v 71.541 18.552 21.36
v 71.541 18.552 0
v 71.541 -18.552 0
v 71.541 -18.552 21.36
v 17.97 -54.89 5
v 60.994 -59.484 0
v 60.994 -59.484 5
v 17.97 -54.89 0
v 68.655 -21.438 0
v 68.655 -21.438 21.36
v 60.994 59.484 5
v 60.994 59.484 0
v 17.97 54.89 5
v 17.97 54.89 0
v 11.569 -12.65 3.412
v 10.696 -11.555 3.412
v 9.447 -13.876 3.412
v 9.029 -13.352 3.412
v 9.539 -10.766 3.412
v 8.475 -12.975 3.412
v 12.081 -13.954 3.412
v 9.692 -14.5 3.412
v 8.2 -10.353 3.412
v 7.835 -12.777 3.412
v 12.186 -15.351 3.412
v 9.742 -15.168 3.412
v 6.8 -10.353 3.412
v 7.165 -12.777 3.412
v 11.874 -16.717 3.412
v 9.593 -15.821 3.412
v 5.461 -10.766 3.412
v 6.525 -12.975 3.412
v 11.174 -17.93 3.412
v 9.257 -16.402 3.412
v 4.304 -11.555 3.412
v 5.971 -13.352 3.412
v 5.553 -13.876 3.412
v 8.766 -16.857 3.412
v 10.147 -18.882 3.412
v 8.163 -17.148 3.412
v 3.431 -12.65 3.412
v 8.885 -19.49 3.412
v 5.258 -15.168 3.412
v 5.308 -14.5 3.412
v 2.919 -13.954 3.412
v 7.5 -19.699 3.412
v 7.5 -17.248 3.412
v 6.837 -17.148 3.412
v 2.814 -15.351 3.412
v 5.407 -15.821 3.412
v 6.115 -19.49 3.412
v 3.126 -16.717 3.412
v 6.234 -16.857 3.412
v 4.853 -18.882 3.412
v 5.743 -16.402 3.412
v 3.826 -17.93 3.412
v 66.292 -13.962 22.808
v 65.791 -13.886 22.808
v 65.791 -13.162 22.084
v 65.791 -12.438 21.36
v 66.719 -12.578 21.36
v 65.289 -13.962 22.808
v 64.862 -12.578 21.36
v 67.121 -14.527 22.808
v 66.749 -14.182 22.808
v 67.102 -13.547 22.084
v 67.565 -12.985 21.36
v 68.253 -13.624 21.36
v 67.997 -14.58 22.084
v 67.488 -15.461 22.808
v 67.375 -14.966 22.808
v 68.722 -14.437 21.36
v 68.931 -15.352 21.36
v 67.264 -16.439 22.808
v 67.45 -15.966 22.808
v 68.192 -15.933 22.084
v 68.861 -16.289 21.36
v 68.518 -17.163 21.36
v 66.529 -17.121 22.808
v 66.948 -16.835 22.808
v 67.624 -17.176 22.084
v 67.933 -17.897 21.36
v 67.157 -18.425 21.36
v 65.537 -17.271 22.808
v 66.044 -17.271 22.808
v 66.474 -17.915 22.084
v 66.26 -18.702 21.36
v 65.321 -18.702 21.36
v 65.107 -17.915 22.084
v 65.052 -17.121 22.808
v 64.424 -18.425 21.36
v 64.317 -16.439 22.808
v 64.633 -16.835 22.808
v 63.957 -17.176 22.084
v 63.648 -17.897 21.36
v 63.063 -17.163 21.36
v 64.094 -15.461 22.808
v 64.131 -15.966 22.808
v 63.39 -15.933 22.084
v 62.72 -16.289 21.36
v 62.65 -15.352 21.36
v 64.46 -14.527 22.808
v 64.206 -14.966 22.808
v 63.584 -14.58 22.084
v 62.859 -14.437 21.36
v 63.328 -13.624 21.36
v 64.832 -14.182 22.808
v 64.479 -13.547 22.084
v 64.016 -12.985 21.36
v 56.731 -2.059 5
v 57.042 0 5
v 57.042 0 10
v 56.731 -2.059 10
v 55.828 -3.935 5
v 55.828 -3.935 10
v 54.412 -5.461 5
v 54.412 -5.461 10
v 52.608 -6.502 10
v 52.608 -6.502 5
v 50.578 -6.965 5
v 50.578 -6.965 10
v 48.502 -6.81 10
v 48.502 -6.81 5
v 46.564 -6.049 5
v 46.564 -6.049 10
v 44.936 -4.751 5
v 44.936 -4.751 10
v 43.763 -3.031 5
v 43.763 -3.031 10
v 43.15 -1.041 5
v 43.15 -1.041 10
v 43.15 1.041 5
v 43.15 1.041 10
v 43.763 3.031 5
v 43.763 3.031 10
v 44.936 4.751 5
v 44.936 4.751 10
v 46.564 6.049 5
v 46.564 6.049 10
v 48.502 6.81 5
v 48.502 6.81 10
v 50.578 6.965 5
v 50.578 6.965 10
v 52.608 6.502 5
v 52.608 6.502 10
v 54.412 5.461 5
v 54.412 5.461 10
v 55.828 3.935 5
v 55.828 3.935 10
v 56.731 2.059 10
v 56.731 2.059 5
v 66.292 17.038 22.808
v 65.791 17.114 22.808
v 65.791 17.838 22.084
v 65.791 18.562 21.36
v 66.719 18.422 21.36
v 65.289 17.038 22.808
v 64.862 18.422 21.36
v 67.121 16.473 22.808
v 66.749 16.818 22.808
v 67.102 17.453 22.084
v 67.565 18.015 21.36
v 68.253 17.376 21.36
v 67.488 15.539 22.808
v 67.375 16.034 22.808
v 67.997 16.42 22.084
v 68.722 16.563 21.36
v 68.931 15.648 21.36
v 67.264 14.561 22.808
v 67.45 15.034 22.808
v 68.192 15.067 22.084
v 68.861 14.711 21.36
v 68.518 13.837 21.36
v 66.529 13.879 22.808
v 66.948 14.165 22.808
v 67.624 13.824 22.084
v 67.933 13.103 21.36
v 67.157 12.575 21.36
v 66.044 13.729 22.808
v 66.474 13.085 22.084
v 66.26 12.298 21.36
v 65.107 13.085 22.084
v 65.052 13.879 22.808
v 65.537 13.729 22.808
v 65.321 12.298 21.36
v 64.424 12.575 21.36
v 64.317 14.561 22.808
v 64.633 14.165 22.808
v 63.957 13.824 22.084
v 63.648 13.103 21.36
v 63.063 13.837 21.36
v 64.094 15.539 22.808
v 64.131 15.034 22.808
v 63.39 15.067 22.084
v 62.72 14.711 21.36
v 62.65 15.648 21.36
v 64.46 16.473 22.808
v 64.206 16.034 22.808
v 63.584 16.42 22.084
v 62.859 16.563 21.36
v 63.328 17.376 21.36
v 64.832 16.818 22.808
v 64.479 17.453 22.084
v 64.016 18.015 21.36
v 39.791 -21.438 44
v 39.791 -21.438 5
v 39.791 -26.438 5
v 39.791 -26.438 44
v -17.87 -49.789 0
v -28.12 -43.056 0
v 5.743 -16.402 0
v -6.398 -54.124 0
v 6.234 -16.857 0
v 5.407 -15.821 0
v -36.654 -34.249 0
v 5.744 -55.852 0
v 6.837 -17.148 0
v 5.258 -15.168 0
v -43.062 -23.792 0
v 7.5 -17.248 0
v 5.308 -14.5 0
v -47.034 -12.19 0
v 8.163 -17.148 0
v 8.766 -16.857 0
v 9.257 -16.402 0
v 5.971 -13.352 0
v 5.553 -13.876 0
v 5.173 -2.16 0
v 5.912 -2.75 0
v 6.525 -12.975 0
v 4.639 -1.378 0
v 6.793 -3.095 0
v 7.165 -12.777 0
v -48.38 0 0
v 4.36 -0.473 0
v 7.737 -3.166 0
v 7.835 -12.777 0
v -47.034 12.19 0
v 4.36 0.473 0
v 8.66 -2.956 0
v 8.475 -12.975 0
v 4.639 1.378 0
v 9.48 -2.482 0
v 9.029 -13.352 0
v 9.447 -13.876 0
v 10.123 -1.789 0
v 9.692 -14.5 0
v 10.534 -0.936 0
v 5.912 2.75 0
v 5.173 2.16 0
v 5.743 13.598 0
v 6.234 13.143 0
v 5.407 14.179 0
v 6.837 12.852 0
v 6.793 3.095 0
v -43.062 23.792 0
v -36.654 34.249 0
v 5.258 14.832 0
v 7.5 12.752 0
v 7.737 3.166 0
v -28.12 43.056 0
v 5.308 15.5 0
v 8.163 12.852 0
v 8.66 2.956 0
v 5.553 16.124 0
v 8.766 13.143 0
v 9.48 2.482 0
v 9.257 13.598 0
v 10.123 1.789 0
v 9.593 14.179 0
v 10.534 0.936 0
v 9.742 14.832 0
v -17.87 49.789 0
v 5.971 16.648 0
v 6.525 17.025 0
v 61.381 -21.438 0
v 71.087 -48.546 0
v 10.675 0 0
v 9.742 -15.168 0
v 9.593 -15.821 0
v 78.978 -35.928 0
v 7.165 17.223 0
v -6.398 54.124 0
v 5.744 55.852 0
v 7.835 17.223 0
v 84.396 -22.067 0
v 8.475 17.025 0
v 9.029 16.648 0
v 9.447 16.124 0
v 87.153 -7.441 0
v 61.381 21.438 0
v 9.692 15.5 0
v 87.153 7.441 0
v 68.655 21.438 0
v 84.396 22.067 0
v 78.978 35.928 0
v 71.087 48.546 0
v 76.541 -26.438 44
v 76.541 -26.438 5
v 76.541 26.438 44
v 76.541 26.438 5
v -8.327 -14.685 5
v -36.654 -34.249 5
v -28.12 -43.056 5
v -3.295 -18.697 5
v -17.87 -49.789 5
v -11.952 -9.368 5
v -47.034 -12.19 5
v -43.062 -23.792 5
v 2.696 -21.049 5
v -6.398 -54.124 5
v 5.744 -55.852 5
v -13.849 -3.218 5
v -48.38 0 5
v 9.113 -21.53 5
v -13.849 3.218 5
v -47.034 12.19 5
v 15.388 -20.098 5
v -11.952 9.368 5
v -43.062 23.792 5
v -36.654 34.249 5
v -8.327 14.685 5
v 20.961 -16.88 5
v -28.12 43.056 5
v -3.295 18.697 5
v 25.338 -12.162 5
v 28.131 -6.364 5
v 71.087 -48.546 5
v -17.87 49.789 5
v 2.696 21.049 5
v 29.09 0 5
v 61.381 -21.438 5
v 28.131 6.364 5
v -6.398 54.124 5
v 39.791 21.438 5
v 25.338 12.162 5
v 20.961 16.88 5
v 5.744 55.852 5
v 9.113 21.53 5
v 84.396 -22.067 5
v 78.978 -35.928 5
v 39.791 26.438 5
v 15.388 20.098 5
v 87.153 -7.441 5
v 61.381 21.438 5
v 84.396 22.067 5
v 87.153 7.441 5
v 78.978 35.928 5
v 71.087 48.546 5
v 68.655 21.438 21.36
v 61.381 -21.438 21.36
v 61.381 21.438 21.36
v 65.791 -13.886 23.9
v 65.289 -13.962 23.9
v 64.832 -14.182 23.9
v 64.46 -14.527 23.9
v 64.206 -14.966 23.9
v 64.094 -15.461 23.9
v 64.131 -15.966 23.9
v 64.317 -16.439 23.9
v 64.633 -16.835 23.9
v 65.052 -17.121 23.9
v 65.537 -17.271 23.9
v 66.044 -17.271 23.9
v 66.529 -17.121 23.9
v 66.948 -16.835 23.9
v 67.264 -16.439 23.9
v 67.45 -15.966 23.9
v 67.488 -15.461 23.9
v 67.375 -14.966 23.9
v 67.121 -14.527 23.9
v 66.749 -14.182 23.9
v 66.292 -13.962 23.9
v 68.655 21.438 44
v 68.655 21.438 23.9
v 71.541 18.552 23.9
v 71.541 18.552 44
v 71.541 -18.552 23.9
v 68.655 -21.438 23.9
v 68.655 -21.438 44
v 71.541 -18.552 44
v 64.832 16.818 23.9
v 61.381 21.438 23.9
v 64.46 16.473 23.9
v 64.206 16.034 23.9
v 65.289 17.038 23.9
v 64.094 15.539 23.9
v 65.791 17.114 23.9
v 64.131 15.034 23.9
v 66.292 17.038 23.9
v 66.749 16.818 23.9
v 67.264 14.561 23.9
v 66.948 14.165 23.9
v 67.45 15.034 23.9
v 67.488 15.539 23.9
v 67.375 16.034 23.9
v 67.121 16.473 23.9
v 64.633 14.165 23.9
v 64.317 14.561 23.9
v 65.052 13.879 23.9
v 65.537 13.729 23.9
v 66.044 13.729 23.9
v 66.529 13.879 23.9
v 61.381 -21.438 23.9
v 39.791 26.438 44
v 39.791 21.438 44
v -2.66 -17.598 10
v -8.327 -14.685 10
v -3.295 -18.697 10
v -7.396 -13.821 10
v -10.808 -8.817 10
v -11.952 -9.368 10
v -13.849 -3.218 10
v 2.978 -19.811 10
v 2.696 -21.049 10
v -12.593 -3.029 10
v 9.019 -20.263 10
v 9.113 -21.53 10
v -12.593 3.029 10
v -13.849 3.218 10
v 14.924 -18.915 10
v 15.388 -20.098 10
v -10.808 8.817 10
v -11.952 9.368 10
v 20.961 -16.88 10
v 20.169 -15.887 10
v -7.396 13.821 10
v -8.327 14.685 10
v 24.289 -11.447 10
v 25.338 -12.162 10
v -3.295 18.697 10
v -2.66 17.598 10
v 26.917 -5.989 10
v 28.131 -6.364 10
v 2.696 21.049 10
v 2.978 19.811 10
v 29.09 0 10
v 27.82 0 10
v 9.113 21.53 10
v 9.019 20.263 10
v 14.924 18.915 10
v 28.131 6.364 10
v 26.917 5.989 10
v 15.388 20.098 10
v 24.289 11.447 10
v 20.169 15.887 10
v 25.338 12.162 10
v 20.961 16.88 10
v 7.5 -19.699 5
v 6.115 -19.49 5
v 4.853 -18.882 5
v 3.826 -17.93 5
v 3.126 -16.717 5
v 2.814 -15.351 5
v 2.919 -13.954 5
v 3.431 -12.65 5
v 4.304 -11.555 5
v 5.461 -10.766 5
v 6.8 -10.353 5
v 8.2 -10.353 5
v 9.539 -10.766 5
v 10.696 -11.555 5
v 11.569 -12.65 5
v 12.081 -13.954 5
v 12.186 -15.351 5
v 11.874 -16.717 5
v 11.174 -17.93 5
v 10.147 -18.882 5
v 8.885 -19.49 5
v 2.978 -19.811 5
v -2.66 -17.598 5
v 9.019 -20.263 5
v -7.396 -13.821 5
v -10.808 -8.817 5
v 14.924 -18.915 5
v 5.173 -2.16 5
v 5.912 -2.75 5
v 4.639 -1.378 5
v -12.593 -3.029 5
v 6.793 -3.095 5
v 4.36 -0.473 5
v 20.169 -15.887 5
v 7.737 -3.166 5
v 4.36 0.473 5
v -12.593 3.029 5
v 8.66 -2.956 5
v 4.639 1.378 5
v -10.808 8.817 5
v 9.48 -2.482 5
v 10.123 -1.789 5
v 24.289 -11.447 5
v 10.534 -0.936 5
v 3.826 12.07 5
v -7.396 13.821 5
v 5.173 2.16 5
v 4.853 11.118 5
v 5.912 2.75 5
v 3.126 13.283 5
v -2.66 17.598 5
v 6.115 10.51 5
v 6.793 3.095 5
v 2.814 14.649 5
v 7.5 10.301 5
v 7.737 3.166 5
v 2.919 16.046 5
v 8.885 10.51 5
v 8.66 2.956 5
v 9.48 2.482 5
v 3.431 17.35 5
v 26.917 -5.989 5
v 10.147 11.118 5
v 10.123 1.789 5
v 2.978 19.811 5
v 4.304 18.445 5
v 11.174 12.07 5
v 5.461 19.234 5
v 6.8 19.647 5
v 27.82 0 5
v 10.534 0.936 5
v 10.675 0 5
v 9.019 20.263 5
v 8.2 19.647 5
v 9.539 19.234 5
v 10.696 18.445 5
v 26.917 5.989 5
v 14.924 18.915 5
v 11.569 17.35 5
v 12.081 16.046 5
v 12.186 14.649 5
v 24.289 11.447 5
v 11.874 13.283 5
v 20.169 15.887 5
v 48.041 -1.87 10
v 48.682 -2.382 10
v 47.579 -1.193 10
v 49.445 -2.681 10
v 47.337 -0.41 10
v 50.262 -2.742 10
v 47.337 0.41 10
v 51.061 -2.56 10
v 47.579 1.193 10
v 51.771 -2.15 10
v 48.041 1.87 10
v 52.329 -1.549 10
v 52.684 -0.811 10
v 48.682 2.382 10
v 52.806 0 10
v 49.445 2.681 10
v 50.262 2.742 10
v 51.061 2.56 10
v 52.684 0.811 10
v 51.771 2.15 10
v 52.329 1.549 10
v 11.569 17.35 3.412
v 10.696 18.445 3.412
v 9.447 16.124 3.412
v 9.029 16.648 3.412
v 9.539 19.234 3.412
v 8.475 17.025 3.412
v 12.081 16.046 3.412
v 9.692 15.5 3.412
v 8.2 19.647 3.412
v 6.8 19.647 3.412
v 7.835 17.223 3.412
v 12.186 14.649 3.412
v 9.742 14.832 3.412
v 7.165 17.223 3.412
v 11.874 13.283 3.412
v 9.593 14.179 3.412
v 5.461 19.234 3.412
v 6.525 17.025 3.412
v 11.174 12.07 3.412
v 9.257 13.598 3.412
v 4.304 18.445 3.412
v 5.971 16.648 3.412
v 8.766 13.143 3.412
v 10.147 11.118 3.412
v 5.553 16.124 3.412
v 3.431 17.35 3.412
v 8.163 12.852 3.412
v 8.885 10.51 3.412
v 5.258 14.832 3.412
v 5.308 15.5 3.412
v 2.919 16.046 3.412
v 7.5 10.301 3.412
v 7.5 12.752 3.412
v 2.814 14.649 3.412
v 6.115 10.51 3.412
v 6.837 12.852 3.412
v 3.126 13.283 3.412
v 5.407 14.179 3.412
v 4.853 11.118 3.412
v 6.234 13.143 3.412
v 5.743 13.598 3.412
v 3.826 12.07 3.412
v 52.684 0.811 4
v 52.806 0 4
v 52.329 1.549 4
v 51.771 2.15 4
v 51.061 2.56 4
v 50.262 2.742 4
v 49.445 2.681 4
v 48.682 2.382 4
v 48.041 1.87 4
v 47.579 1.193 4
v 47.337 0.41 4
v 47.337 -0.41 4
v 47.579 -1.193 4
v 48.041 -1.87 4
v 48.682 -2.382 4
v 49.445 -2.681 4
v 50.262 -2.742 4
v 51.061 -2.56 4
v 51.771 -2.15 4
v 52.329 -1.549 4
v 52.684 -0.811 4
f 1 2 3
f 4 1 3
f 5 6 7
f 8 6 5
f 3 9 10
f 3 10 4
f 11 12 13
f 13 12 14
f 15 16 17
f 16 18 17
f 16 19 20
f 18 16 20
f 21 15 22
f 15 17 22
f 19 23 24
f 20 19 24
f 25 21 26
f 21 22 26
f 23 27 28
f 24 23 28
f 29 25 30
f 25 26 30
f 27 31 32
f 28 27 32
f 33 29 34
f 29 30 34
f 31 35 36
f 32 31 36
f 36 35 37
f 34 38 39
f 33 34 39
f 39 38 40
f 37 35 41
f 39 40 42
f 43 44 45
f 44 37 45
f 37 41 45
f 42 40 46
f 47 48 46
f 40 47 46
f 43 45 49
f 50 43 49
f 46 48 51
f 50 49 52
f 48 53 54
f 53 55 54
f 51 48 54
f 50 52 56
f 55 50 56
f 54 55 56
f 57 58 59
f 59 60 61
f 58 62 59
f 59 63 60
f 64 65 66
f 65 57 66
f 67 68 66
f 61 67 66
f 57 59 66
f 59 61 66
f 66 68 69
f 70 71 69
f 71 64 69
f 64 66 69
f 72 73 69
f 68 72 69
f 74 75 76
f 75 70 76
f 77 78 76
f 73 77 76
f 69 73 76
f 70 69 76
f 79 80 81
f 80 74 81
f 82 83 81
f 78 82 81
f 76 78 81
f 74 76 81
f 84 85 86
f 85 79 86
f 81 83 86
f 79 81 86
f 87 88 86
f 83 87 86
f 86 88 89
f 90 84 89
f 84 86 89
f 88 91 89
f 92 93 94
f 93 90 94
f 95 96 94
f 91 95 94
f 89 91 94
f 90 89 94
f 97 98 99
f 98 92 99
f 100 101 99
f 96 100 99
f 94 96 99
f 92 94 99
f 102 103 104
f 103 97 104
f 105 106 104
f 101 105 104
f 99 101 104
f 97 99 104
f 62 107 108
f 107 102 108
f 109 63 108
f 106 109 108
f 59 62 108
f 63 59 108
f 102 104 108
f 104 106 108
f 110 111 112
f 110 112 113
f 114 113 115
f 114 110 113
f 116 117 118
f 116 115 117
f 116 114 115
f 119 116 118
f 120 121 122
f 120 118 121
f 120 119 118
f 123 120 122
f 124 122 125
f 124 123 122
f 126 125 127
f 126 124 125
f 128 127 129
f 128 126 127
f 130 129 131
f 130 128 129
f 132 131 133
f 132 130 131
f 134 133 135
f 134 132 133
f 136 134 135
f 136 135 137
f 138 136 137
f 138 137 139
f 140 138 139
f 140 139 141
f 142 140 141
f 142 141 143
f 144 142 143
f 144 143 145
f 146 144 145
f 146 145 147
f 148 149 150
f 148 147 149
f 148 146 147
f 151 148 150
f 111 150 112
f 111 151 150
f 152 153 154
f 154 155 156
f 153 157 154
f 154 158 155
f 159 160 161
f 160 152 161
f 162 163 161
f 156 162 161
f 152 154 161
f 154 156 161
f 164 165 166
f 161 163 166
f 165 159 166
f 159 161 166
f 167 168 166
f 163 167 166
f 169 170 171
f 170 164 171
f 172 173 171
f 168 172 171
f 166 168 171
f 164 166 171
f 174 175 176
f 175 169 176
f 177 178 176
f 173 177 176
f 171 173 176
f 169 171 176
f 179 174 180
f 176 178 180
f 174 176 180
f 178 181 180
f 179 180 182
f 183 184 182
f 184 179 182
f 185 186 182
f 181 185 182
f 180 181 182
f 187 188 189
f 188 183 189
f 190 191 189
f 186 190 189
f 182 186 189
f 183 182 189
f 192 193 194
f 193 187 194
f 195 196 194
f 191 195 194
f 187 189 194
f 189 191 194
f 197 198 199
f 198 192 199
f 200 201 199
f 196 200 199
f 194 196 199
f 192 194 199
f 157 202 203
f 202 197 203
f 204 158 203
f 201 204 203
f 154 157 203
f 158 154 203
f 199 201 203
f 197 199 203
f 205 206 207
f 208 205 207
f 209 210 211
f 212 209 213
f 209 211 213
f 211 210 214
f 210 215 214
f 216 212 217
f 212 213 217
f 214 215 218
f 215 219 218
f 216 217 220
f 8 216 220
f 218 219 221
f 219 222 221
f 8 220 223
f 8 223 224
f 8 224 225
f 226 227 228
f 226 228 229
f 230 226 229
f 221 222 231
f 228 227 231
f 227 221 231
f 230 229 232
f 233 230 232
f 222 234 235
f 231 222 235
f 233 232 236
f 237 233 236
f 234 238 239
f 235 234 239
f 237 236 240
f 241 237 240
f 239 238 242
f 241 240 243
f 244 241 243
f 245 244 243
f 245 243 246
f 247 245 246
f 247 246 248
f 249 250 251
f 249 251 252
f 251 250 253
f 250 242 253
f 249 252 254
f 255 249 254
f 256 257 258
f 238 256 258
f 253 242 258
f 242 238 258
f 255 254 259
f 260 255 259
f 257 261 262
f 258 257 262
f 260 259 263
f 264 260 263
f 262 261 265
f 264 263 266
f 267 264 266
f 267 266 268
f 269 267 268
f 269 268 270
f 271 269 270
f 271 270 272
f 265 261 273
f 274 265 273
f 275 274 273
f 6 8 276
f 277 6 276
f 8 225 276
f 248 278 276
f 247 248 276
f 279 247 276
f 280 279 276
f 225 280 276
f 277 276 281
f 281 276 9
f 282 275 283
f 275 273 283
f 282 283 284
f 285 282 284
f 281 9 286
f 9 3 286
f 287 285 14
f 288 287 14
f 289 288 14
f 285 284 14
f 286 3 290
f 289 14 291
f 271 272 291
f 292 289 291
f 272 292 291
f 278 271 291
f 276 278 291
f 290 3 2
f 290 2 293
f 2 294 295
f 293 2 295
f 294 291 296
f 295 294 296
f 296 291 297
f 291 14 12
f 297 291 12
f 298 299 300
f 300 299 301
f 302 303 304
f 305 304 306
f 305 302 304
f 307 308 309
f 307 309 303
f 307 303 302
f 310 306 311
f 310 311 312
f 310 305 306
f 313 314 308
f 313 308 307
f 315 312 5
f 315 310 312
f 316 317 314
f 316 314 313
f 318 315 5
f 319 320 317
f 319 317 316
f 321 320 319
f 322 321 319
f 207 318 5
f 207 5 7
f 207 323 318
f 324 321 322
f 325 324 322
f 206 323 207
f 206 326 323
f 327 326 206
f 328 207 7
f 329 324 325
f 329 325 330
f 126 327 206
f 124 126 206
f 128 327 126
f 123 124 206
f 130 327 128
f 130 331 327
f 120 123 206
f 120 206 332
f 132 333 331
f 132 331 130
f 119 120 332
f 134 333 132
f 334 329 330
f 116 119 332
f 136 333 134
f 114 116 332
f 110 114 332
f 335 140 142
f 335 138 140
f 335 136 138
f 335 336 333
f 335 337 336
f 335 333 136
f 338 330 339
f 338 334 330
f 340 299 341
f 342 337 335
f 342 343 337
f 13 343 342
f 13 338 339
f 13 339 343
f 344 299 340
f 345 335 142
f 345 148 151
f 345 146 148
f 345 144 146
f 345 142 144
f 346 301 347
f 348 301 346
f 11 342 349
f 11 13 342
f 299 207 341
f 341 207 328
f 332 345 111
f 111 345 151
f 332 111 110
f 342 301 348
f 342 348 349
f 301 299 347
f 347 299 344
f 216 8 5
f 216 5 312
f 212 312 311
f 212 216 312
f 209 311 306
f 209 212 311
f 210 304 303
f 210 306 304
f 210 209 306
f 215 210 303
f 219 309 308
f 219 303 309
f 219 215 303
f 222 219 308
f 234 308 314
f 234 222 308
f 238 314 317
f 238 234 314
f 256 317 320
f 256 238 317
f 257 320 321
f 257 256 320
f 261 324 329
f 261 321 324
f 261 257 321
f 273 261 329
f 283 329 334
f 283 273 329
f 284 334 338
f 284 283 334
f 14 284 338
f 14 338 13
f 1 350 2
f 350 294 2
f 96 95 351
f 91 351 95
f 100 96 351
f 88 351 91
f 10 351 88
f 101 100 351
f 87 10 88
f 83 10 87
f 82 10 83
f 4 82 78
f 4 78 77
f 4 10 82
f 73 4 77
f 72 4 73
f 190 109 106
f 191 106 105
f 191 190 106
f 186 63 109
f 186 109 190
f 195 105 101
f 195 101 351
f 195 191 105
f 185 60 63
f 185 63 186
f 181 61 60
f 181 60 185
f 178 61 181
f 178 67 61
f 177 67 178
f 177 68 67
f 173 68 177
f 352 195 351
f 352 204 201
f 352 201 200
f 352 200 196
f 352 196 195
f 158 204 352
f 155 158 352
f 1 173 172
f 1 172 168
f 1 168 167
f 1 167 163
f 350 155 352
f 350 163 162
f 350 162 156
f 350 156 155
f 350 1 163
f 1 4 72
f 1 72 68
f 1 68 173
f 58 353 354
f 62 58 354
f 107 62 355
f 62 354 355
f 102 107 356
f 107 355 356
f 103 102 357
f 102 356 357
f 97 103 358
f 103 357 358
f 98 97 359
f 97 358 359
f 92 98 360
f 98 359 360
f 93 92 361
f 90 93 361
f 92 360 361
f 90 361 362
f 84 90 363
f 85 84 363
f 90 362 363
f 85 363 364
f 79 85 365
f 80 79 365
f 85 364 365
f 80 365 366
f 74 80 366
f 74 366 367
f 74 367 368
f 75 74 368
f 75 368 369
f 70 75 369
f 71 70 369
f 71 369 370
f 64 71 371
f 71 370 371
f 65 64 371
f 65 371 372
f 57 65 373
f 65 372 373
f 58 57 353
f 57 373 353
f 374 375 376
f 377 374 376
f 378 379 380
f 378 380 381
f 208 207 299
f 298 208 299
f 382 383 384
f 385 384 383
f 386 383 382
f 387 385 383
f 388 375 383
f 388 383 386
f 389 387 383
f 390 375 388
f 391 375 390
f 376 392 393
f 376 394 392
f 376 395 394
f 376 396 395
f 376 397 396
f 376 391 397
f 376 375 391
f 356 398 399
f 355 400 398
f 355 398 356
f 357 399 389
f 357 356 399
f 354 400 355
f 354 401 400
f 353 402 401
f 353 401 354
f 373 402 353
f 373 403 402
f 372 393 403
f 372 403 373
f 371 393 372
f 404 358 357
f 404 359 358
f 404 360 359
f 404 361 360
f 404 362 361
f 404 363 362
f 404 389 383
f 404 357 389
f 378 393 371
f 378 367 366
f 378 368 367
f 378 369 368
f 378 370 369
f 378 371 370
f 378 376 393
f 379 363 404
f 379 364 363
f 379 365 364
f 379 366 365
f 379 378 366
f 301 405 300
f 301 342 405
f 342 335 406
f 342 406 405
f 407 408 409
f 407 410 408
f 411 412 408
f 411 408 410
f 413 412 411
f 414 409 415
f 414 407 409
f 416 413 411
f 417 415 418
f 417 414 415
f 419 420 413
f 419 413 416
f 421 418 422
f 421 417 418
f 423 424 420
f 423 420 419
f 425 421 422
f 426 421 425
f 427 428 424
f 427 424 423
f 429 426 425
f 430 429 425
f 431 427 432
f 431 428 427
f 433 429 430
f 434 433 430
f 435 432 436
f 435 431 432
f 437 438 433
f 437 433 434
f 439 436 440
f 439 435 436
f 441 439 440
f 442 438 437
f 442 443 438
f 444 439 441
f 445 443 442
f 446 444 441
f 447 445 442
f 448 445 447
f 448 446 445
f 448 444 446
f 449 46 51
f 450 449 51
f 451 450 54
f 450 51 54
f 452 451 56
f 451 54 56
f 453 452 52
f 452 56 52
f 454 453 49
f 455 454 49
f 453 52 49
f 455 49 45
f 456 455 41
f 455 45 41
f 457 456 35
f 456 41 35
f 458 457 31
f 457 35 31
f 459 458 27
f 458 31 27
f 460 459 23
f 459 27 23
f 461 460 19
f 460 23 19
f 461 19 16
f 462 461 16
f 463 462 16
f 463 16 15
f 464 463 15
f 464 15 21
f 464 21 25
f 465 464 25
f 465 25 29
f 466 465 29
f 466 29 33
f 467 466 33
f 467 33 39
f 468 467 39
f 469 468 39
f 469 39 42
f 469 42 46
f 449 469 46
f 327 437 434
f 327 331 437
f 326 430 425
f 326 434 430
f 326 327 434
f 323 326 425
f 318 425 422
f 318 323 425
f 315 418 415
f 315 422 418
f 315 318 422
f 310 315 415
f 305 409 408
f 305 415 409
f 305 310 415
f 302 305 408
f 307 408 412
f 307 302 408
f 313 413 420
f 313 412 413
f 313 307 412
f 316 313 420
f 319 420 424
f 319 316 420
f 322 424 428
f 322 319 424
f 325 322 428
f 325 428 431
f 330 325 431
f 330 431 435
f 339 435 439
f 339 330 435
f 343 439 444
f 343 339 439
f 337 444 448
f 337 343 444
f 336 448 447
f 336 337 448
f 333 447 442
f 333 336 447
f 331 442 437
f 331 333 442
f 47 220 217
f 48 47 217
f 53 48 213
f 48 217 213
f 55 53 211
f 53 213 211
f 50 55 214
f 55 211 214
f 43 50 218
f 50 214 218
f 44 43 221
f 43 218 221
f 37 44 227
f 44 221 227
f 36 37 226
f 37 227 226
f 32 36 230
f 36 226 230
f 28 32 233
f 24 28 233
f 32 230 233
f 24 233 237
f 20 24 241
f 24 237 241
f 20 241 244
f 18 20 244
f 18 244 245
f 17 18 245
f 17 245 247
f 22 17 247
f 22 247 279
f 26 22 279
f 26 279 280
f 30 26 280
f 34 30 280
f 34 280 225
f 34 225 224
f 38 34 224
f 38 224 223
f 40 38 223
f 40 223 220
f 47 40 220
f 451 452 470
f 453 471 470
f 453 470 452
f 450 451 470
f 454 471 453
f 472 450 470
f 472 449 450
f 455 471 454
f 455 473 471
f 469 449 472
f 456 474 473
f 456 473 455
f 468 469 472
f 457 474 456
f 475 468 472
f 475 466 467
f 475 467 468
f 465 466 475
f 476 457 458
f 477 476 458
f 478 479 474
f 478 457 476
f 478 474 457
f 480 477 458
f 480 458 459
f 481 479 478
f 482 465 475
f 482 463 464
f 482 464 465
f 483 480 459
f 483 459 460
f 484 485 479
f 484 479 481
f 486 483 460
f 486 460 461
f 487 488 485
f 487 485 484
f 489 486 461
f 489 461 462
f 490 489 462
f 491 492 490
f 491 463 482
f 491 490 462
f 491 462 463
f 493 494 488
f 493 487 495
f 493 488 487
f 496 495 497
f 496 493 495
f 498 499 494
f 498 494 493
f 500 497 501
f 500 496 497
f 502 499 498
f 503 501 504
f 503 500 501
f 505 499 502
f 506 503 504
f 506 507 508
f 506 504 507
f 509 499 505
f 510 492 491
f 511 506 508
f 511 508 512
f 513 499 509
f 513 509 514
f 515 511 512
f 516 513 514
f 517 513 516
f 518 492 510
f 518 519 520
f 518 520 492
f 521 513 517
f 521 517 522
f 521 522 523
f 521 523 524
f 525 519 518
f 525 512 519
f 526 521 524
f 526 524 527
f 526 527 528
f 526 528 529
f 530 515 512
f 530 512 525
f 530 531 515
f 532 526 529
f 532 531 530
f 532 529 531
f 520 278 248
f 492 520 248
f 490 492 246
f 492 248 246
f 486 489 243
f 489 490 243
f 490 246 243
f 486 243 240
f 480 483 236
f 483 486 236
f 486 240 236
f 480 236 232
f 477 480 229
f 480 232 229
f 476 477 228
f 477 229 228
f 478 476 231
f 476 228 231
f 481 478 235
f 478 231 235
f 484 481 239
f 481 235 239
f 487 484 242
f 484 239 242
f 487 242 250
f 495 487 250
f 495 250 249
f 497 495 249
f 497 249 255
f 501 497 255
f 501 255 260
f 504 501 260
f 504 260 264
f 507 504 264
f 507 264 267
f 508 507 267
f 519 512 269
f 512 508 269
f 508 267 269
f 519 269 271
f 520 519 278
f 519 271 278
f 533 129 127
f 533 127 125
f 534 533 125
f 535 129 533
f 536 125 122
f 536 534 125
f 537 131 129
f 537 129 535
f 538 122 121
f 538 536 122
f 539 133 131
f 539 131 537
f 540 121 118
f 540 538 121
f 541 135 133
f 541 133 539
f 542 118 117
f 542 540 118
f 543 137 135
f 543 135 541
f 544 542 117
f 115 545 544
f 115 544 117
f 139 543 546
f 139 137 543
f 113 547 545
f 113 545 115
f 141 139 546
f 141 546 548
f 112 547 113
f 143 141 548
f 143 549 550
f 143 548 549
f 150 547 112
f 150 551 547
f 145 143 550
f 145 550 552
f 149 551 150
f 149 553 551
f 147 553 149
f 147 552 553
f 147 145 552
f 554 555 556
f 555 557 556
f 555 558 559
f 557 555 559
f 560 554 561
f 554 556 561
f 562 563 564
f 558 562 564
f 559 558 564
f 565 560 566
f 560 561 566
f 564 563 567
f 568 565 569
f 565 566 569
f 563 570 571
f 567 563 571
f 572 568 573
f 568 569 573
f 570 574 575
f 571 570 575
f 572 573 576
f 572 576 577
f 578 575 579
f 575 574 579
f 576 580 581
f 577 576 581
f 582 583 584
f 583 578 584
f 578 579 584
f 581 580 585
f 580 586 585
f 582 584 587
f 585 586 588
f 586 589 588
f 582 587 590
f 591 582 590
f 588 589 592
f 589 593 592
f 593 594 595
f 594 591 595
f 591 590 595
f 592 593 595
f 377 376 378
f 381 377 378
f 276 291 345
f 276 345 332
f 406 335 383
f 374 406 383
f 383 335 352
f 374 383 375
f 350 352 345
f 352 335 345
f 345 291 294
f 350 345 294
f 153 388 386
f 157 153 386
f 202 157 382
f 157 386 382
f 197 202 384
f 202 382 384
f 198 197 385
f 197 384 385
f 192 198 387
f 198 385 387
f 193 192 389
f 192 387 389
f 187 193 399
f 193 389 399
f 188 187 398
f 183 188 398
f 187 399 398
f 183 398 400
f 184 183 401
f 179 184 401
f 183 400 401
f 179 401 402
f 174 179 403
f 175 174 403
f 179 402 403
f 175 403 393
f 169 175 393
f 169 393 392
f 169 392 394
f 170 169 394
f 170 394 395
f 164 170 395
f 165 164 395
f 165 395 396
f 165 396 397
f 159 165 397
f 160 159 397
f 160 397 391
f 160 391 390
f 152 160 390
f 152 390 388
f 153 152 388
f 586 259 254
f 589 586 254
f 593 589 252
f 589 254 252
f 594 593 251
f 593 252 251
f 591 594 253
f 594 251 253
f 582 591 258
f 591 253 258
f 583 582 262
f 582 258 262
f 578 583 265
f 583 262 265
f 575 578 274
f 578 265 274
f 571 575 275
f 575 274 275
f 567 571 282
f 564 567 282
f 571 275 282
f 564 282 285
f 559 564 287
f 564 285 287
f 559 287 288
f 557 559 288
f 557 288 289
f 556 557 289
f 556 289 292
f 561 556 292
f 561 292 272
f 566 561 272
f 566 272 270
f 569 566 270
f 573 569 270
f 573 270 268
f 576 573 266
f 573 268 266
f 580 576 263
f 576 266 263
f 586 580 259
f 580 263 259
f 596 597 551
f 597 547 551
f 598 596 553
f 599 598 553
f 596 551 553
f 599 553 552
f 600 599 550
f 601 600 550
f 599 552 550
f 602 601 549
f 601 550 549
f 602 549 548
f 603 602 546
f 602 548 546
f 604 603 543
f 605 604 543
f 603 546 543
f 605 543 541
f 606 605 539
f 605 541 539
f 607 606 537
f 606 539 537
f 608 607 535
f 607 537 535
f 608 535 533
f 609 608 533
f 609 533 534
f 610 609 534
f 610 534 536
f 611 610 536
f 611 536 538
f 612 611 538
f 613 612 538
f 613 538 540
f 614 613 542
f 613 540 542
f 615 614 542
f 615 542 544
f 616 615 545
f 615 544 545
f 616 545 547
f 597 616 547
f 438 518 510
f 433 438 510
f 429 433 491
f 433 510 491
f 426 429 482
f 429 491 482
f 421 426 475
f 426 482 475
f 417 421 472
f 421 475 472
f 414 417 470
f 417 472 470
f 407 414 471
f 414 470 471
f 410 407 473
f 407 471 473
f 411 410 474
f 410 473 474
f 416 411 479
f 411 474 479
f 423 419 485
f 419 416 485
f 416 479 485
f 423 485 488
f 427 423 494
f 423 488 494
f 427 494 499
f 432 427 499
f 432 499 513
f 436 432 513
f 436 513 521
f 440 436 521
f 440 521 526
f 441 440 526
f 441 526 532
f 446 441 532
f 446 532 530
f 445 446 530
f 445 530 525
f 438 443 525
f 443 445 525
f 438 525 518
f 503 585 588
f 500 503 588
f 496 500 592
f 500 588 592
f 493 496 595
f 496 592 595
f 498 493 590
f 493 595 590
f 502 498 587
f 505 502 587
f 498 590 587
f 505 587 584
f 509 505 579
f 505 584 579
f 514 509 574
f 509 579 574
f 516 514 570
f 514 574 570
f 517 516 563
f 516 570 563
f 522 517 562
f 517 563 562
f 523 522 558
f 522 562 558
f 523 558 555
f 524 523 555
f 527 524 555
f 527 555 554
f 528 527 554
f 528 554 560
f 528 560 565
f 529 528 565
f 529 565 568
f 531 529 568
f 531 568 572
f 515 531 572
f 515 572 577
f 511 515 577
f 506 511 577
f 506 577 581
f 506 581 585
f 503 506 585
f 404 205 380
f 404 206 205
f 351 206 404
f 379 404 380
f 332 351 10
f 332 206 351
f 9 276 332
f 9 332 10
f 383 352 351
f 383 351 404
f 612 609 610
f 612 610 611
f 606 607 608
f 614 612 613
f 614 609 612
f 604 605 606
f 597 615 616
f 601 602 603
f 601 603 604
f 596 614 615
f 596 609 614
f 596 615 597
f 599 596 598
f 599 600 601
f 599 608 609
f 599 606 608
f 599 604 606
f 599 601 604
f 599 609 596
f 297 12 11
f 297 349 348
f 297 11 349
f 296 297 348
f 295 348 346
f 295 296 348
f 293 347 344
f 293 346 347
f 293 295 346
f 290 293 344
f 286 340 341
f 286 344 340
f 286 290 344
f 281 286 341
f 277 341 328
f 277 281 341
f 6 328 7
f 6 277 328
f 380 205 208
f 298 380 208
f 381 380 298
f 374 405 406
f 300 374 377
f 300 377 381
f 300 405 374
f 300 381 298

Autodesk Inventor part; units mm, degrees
ref_plane "YZ Plane" through (0, 0, 0) normal (1, 0, 0) x (0, 1, 0)
ref_plane "XZ Plane" through (0, 0, 0) normal (0, 1, 0) x (-1, 0, 0)
ref_plane "Work Plane1" through (0, 0, 0) normal (0, 0, 1) x (1, 0, 0)
sketch "Sketch1" plane through (0, 0, 0) normal (0, 0, 1) x (1, 0, 0)
  circle A0 centre (7.5, 0) radius 3.175 projected
  circle A1 centre (7.5, 15) radius 2.5 construction
  circle A2 centre (7.5, -15) radius 2.5 construction
  arc A3 (69.3283, 4.3421) -> (-40.362, 3.8938) centre (14.5, 0) ccw construction
  arc A4 (17.9696, 54.8905) -> (17.9696, -54.8905) centre (7.5, 0) ccw
  arc A5 (60.9943, -59.4841) -> (60.9943, 59.4841) centre (7.5, 0) ccw projected
  line L0 (60.9943, 59.4841) -> (17.9696, 54.8905)
  line L1 (60.9943, -59.4841) -> (17.9696, -54.8905)
  point P0 (0, 0)
  dimension "d0" = 55.88
extrude "Primary Shaft Bore" add sketch "Sketch1" along normal blind 5
sketch "Sketch2" plane through (0, 0, 5) normal (0, 0, 1) x (1, 0, 0)
  circle A0 centre (7.5, 0) radius 3.175 construction
  circle A1 centre (7.5, 0) radius 3.175 projected
  circle A2 centre (7.5, 0) radius 20.32
  circle A3 centre (7.5, 0) radius 21.59
  point P0 (0, 0)
  dimension "d3" = 40.64
  dimension "d4" = 43.18
extrude "Large Gear Seat" add sketch "Sketch2" along normal blind 5 contours A3
sketch "Sketch4" plane through (0, 0, 0) normal (0, 0, -1) x (-1, 0, 0)
  circle A0 centre (-7.5, 15) radius 2.5 construction
  circle A1 centre (-7.5, -15) radius 2.5 construction
  point P0 (0, 0)
ref_plane "Work Plane2" through (-496.14, 0, 5) normal (0, 1, 0) x (0, 0, -1)
sketch "Sketch5" plane through (0, 0, 5) normal (0, 0, 1) x (1, 0, 0)
  circle A0 centre (7.5, 0) radius 3.175 projected
  circle A1 centre (7.5, 15) radius 1.5 projected
  circle A2 centre (7.5, -15) radius 1.5 projected
  point P0 (0, 0)
ref_plane "Work Plane5" through (7.5, 0, 5) normal (-1, 0, 0) x (0, -1, 0)
sketch "Sketch7" plane through (0, 0, 5) normal (0, 0, 1) x (1, 0, 0)
  arc A0 (51.7179, -2) -> (48.3952, -2) centre (50.0565, 0) ccw construction
  circle A1 centre (50.0565, 0) radius 6.985
  point P0 (0, 0)
  dimension "d17" = 13.97
extrude "Second Gear Seat" add sketch "Sketch7" along normal up to surface (5 mm away)
sketch "Sketch8" plane through (0, 0, 5) normal (0, 0, 1) x (1, 0, 0)
  point P0 (0, 0)
  point P1 (7.5, 15)
  point P2 (7.5, -15)
hole "Hole1" at (7.5, 15, 5) at (7.5, -15, 5) direction (0, 0, -1) diameter 4.4958 end through all counterbore diameter 9.398 counterbore depth 1.5875 clearance for "Flat Head Machine Screw" size "M4" standard "Ansi Metric M Profile"
sketch "Sketch9" plane through (50.0565, 0, 10) normal (0, 0, 1) x (1, 0, 0)
  arc A0 (1.6613, -2) -> (-1.6613, -2) centre (0, 0) ccw construction
  circle A1 centre (0, 0) radius 2.75
  point P0 (-50.0565, 0)
  dimension "d27" = 5.5
extrude "Extrusion7" cut sketch "Sketch9" against normal blind 6
sketch "Sketch10" plane through (0, 0, 5) normal (0, 0, 1) x (1, 0, 0)
  line L0 (114.676, 0) -> (-75.556, 0) construction
  line L1 (71.4406, -11.5878) -> (71.4406, 11.4122) construction
  line L2 (61.7906, 21.0622) -> (38.7906, 21.0622) construction
  line L3 (38.7906, -21.2378) -> (61.7906, -21.2378) construction
  line L4 (67.587, -21.0914) -> (71.2941, -17.3843) construction
  line L5 (71.2941, 17.2086) -> (67.587, 20.9157) construction
  line L6 (39.7906, -21.4378) -> (68.6548, -21.4378)
  line L7 (68.6548, -21.4378) -> (71.5406, -18.552)
  line L8 (71.5406, -18.552) -> (71.5406, 0)
  line L9 (39.7906, -21.4378) -> (39.7906, -26.4378)
  line L10 (39.7906, -26.4378) -> (76.5406, -26.4378)
  line L11 (76.5406, -26.4378) -> (76.5406, 0)
  line L12 (39.7906, 21.4378) -> (68.6548, 21.4378)
  line L13 (68.6548, 21.4378) -> (71.5406, 18.552)
  line L14 (71.5406, 18.552) -> (71.5406, 0)
  line L15 (39.7906, 21.4378) -> (39.7906, 26.4378)
  line L16 (39.7906, 26.4378) -> (76.5406, 26.4378)
  line L17 (76.5406, 26.4378) -> (76.5406, 0)
  point P0 (0, 0)
  dimension "d30" = 0.2
  dimension "d31" = 0.1
  dimension "d32" = 5
  dimension "d33" = 5
  dimension "d34" = 1
  dimension "d35" = 1
ref_plane "Work Plane6" through (29.6406, -20.7378, 44) normal (0, 0, 1) x (1, 0, 0)
extrude "Extrusion8" add sketch "Sketch10" along normal up to surface (39 mm away)
sketch "Sketch11" plane through (71.5406, -18.552, 5) normal (-1, 0, 0) x (0, 0, 1)
  line L0 (0, -2.8858) -> (39, -2.8858) projected
  line L1 (18.9, -2.8858) -> (16.36, -2.8858)
  line L2 (16.36, -2.8858) -> (16.36, 40.2564)
  line L3 (16.36, 40.2564) -> (18.9, 40.2564)
  line L4 (18.9, 40.2564) -> (18.9, -2.8858)
  line L5 (19, 35.4071) -> (19, 1.5213) construction
  point P0 (-5, 18.552)
  dimension "d38" = 2.54
  dimension "d39" = 0.1
extrude "Extrusion9" add sketch "Sketch11" along normal blind 10.16
sketch "Sketch12" plane through (0, 0, 0) normal (0, 0, -1) x (-1, 0, 0)
  line L0 (-61.3806, 21.4378) -> (-61.3806, -21.4378) projected
  line L1 (-39.7906, -21.4378) -> (-68.6548, -21.4378) projected
  line L2 (-68.6548, -21.4378) -> (-71.5406, -18.552) projected
  line L3 (-71.5406, -18.552) -> (-71.5406, 18.552) projected
  line L4 (-71.5406, 18.552) -> (-68.6548, 21.4378) projected
  line L5 (-68.6548, 21.4378) -> (-39.7906, 21.4378) projected
  point P0 (0, 0)
extrude "Extrusion10" cut sketch "Sketch12" against normal blind 10.16
sketch "Sketch13" plane through (71.5406, -18.552, 21.36) normal (0, 0, -1) x (-1, 0, 0)
  circle A0 centre (5.75, 2.9642) radius 2.4 construction
  circle A1 centre (5.75, 33.9642) radius 2.4 construction
  point P0 (71.5406, 18.552)
hole "Hole2" at (65.7906, -15.5878, 21.36) at (65.7906, 15.4122, 21.36) direction (0, 0, 1) diameter 3.4036 end through all countersink diameter 6.2992 countersink angle 90 clearance for "Flat Head Machine Screw" size "M3" standard "Ansi Metric M Profile"
properties part number "TopGearPlate"
